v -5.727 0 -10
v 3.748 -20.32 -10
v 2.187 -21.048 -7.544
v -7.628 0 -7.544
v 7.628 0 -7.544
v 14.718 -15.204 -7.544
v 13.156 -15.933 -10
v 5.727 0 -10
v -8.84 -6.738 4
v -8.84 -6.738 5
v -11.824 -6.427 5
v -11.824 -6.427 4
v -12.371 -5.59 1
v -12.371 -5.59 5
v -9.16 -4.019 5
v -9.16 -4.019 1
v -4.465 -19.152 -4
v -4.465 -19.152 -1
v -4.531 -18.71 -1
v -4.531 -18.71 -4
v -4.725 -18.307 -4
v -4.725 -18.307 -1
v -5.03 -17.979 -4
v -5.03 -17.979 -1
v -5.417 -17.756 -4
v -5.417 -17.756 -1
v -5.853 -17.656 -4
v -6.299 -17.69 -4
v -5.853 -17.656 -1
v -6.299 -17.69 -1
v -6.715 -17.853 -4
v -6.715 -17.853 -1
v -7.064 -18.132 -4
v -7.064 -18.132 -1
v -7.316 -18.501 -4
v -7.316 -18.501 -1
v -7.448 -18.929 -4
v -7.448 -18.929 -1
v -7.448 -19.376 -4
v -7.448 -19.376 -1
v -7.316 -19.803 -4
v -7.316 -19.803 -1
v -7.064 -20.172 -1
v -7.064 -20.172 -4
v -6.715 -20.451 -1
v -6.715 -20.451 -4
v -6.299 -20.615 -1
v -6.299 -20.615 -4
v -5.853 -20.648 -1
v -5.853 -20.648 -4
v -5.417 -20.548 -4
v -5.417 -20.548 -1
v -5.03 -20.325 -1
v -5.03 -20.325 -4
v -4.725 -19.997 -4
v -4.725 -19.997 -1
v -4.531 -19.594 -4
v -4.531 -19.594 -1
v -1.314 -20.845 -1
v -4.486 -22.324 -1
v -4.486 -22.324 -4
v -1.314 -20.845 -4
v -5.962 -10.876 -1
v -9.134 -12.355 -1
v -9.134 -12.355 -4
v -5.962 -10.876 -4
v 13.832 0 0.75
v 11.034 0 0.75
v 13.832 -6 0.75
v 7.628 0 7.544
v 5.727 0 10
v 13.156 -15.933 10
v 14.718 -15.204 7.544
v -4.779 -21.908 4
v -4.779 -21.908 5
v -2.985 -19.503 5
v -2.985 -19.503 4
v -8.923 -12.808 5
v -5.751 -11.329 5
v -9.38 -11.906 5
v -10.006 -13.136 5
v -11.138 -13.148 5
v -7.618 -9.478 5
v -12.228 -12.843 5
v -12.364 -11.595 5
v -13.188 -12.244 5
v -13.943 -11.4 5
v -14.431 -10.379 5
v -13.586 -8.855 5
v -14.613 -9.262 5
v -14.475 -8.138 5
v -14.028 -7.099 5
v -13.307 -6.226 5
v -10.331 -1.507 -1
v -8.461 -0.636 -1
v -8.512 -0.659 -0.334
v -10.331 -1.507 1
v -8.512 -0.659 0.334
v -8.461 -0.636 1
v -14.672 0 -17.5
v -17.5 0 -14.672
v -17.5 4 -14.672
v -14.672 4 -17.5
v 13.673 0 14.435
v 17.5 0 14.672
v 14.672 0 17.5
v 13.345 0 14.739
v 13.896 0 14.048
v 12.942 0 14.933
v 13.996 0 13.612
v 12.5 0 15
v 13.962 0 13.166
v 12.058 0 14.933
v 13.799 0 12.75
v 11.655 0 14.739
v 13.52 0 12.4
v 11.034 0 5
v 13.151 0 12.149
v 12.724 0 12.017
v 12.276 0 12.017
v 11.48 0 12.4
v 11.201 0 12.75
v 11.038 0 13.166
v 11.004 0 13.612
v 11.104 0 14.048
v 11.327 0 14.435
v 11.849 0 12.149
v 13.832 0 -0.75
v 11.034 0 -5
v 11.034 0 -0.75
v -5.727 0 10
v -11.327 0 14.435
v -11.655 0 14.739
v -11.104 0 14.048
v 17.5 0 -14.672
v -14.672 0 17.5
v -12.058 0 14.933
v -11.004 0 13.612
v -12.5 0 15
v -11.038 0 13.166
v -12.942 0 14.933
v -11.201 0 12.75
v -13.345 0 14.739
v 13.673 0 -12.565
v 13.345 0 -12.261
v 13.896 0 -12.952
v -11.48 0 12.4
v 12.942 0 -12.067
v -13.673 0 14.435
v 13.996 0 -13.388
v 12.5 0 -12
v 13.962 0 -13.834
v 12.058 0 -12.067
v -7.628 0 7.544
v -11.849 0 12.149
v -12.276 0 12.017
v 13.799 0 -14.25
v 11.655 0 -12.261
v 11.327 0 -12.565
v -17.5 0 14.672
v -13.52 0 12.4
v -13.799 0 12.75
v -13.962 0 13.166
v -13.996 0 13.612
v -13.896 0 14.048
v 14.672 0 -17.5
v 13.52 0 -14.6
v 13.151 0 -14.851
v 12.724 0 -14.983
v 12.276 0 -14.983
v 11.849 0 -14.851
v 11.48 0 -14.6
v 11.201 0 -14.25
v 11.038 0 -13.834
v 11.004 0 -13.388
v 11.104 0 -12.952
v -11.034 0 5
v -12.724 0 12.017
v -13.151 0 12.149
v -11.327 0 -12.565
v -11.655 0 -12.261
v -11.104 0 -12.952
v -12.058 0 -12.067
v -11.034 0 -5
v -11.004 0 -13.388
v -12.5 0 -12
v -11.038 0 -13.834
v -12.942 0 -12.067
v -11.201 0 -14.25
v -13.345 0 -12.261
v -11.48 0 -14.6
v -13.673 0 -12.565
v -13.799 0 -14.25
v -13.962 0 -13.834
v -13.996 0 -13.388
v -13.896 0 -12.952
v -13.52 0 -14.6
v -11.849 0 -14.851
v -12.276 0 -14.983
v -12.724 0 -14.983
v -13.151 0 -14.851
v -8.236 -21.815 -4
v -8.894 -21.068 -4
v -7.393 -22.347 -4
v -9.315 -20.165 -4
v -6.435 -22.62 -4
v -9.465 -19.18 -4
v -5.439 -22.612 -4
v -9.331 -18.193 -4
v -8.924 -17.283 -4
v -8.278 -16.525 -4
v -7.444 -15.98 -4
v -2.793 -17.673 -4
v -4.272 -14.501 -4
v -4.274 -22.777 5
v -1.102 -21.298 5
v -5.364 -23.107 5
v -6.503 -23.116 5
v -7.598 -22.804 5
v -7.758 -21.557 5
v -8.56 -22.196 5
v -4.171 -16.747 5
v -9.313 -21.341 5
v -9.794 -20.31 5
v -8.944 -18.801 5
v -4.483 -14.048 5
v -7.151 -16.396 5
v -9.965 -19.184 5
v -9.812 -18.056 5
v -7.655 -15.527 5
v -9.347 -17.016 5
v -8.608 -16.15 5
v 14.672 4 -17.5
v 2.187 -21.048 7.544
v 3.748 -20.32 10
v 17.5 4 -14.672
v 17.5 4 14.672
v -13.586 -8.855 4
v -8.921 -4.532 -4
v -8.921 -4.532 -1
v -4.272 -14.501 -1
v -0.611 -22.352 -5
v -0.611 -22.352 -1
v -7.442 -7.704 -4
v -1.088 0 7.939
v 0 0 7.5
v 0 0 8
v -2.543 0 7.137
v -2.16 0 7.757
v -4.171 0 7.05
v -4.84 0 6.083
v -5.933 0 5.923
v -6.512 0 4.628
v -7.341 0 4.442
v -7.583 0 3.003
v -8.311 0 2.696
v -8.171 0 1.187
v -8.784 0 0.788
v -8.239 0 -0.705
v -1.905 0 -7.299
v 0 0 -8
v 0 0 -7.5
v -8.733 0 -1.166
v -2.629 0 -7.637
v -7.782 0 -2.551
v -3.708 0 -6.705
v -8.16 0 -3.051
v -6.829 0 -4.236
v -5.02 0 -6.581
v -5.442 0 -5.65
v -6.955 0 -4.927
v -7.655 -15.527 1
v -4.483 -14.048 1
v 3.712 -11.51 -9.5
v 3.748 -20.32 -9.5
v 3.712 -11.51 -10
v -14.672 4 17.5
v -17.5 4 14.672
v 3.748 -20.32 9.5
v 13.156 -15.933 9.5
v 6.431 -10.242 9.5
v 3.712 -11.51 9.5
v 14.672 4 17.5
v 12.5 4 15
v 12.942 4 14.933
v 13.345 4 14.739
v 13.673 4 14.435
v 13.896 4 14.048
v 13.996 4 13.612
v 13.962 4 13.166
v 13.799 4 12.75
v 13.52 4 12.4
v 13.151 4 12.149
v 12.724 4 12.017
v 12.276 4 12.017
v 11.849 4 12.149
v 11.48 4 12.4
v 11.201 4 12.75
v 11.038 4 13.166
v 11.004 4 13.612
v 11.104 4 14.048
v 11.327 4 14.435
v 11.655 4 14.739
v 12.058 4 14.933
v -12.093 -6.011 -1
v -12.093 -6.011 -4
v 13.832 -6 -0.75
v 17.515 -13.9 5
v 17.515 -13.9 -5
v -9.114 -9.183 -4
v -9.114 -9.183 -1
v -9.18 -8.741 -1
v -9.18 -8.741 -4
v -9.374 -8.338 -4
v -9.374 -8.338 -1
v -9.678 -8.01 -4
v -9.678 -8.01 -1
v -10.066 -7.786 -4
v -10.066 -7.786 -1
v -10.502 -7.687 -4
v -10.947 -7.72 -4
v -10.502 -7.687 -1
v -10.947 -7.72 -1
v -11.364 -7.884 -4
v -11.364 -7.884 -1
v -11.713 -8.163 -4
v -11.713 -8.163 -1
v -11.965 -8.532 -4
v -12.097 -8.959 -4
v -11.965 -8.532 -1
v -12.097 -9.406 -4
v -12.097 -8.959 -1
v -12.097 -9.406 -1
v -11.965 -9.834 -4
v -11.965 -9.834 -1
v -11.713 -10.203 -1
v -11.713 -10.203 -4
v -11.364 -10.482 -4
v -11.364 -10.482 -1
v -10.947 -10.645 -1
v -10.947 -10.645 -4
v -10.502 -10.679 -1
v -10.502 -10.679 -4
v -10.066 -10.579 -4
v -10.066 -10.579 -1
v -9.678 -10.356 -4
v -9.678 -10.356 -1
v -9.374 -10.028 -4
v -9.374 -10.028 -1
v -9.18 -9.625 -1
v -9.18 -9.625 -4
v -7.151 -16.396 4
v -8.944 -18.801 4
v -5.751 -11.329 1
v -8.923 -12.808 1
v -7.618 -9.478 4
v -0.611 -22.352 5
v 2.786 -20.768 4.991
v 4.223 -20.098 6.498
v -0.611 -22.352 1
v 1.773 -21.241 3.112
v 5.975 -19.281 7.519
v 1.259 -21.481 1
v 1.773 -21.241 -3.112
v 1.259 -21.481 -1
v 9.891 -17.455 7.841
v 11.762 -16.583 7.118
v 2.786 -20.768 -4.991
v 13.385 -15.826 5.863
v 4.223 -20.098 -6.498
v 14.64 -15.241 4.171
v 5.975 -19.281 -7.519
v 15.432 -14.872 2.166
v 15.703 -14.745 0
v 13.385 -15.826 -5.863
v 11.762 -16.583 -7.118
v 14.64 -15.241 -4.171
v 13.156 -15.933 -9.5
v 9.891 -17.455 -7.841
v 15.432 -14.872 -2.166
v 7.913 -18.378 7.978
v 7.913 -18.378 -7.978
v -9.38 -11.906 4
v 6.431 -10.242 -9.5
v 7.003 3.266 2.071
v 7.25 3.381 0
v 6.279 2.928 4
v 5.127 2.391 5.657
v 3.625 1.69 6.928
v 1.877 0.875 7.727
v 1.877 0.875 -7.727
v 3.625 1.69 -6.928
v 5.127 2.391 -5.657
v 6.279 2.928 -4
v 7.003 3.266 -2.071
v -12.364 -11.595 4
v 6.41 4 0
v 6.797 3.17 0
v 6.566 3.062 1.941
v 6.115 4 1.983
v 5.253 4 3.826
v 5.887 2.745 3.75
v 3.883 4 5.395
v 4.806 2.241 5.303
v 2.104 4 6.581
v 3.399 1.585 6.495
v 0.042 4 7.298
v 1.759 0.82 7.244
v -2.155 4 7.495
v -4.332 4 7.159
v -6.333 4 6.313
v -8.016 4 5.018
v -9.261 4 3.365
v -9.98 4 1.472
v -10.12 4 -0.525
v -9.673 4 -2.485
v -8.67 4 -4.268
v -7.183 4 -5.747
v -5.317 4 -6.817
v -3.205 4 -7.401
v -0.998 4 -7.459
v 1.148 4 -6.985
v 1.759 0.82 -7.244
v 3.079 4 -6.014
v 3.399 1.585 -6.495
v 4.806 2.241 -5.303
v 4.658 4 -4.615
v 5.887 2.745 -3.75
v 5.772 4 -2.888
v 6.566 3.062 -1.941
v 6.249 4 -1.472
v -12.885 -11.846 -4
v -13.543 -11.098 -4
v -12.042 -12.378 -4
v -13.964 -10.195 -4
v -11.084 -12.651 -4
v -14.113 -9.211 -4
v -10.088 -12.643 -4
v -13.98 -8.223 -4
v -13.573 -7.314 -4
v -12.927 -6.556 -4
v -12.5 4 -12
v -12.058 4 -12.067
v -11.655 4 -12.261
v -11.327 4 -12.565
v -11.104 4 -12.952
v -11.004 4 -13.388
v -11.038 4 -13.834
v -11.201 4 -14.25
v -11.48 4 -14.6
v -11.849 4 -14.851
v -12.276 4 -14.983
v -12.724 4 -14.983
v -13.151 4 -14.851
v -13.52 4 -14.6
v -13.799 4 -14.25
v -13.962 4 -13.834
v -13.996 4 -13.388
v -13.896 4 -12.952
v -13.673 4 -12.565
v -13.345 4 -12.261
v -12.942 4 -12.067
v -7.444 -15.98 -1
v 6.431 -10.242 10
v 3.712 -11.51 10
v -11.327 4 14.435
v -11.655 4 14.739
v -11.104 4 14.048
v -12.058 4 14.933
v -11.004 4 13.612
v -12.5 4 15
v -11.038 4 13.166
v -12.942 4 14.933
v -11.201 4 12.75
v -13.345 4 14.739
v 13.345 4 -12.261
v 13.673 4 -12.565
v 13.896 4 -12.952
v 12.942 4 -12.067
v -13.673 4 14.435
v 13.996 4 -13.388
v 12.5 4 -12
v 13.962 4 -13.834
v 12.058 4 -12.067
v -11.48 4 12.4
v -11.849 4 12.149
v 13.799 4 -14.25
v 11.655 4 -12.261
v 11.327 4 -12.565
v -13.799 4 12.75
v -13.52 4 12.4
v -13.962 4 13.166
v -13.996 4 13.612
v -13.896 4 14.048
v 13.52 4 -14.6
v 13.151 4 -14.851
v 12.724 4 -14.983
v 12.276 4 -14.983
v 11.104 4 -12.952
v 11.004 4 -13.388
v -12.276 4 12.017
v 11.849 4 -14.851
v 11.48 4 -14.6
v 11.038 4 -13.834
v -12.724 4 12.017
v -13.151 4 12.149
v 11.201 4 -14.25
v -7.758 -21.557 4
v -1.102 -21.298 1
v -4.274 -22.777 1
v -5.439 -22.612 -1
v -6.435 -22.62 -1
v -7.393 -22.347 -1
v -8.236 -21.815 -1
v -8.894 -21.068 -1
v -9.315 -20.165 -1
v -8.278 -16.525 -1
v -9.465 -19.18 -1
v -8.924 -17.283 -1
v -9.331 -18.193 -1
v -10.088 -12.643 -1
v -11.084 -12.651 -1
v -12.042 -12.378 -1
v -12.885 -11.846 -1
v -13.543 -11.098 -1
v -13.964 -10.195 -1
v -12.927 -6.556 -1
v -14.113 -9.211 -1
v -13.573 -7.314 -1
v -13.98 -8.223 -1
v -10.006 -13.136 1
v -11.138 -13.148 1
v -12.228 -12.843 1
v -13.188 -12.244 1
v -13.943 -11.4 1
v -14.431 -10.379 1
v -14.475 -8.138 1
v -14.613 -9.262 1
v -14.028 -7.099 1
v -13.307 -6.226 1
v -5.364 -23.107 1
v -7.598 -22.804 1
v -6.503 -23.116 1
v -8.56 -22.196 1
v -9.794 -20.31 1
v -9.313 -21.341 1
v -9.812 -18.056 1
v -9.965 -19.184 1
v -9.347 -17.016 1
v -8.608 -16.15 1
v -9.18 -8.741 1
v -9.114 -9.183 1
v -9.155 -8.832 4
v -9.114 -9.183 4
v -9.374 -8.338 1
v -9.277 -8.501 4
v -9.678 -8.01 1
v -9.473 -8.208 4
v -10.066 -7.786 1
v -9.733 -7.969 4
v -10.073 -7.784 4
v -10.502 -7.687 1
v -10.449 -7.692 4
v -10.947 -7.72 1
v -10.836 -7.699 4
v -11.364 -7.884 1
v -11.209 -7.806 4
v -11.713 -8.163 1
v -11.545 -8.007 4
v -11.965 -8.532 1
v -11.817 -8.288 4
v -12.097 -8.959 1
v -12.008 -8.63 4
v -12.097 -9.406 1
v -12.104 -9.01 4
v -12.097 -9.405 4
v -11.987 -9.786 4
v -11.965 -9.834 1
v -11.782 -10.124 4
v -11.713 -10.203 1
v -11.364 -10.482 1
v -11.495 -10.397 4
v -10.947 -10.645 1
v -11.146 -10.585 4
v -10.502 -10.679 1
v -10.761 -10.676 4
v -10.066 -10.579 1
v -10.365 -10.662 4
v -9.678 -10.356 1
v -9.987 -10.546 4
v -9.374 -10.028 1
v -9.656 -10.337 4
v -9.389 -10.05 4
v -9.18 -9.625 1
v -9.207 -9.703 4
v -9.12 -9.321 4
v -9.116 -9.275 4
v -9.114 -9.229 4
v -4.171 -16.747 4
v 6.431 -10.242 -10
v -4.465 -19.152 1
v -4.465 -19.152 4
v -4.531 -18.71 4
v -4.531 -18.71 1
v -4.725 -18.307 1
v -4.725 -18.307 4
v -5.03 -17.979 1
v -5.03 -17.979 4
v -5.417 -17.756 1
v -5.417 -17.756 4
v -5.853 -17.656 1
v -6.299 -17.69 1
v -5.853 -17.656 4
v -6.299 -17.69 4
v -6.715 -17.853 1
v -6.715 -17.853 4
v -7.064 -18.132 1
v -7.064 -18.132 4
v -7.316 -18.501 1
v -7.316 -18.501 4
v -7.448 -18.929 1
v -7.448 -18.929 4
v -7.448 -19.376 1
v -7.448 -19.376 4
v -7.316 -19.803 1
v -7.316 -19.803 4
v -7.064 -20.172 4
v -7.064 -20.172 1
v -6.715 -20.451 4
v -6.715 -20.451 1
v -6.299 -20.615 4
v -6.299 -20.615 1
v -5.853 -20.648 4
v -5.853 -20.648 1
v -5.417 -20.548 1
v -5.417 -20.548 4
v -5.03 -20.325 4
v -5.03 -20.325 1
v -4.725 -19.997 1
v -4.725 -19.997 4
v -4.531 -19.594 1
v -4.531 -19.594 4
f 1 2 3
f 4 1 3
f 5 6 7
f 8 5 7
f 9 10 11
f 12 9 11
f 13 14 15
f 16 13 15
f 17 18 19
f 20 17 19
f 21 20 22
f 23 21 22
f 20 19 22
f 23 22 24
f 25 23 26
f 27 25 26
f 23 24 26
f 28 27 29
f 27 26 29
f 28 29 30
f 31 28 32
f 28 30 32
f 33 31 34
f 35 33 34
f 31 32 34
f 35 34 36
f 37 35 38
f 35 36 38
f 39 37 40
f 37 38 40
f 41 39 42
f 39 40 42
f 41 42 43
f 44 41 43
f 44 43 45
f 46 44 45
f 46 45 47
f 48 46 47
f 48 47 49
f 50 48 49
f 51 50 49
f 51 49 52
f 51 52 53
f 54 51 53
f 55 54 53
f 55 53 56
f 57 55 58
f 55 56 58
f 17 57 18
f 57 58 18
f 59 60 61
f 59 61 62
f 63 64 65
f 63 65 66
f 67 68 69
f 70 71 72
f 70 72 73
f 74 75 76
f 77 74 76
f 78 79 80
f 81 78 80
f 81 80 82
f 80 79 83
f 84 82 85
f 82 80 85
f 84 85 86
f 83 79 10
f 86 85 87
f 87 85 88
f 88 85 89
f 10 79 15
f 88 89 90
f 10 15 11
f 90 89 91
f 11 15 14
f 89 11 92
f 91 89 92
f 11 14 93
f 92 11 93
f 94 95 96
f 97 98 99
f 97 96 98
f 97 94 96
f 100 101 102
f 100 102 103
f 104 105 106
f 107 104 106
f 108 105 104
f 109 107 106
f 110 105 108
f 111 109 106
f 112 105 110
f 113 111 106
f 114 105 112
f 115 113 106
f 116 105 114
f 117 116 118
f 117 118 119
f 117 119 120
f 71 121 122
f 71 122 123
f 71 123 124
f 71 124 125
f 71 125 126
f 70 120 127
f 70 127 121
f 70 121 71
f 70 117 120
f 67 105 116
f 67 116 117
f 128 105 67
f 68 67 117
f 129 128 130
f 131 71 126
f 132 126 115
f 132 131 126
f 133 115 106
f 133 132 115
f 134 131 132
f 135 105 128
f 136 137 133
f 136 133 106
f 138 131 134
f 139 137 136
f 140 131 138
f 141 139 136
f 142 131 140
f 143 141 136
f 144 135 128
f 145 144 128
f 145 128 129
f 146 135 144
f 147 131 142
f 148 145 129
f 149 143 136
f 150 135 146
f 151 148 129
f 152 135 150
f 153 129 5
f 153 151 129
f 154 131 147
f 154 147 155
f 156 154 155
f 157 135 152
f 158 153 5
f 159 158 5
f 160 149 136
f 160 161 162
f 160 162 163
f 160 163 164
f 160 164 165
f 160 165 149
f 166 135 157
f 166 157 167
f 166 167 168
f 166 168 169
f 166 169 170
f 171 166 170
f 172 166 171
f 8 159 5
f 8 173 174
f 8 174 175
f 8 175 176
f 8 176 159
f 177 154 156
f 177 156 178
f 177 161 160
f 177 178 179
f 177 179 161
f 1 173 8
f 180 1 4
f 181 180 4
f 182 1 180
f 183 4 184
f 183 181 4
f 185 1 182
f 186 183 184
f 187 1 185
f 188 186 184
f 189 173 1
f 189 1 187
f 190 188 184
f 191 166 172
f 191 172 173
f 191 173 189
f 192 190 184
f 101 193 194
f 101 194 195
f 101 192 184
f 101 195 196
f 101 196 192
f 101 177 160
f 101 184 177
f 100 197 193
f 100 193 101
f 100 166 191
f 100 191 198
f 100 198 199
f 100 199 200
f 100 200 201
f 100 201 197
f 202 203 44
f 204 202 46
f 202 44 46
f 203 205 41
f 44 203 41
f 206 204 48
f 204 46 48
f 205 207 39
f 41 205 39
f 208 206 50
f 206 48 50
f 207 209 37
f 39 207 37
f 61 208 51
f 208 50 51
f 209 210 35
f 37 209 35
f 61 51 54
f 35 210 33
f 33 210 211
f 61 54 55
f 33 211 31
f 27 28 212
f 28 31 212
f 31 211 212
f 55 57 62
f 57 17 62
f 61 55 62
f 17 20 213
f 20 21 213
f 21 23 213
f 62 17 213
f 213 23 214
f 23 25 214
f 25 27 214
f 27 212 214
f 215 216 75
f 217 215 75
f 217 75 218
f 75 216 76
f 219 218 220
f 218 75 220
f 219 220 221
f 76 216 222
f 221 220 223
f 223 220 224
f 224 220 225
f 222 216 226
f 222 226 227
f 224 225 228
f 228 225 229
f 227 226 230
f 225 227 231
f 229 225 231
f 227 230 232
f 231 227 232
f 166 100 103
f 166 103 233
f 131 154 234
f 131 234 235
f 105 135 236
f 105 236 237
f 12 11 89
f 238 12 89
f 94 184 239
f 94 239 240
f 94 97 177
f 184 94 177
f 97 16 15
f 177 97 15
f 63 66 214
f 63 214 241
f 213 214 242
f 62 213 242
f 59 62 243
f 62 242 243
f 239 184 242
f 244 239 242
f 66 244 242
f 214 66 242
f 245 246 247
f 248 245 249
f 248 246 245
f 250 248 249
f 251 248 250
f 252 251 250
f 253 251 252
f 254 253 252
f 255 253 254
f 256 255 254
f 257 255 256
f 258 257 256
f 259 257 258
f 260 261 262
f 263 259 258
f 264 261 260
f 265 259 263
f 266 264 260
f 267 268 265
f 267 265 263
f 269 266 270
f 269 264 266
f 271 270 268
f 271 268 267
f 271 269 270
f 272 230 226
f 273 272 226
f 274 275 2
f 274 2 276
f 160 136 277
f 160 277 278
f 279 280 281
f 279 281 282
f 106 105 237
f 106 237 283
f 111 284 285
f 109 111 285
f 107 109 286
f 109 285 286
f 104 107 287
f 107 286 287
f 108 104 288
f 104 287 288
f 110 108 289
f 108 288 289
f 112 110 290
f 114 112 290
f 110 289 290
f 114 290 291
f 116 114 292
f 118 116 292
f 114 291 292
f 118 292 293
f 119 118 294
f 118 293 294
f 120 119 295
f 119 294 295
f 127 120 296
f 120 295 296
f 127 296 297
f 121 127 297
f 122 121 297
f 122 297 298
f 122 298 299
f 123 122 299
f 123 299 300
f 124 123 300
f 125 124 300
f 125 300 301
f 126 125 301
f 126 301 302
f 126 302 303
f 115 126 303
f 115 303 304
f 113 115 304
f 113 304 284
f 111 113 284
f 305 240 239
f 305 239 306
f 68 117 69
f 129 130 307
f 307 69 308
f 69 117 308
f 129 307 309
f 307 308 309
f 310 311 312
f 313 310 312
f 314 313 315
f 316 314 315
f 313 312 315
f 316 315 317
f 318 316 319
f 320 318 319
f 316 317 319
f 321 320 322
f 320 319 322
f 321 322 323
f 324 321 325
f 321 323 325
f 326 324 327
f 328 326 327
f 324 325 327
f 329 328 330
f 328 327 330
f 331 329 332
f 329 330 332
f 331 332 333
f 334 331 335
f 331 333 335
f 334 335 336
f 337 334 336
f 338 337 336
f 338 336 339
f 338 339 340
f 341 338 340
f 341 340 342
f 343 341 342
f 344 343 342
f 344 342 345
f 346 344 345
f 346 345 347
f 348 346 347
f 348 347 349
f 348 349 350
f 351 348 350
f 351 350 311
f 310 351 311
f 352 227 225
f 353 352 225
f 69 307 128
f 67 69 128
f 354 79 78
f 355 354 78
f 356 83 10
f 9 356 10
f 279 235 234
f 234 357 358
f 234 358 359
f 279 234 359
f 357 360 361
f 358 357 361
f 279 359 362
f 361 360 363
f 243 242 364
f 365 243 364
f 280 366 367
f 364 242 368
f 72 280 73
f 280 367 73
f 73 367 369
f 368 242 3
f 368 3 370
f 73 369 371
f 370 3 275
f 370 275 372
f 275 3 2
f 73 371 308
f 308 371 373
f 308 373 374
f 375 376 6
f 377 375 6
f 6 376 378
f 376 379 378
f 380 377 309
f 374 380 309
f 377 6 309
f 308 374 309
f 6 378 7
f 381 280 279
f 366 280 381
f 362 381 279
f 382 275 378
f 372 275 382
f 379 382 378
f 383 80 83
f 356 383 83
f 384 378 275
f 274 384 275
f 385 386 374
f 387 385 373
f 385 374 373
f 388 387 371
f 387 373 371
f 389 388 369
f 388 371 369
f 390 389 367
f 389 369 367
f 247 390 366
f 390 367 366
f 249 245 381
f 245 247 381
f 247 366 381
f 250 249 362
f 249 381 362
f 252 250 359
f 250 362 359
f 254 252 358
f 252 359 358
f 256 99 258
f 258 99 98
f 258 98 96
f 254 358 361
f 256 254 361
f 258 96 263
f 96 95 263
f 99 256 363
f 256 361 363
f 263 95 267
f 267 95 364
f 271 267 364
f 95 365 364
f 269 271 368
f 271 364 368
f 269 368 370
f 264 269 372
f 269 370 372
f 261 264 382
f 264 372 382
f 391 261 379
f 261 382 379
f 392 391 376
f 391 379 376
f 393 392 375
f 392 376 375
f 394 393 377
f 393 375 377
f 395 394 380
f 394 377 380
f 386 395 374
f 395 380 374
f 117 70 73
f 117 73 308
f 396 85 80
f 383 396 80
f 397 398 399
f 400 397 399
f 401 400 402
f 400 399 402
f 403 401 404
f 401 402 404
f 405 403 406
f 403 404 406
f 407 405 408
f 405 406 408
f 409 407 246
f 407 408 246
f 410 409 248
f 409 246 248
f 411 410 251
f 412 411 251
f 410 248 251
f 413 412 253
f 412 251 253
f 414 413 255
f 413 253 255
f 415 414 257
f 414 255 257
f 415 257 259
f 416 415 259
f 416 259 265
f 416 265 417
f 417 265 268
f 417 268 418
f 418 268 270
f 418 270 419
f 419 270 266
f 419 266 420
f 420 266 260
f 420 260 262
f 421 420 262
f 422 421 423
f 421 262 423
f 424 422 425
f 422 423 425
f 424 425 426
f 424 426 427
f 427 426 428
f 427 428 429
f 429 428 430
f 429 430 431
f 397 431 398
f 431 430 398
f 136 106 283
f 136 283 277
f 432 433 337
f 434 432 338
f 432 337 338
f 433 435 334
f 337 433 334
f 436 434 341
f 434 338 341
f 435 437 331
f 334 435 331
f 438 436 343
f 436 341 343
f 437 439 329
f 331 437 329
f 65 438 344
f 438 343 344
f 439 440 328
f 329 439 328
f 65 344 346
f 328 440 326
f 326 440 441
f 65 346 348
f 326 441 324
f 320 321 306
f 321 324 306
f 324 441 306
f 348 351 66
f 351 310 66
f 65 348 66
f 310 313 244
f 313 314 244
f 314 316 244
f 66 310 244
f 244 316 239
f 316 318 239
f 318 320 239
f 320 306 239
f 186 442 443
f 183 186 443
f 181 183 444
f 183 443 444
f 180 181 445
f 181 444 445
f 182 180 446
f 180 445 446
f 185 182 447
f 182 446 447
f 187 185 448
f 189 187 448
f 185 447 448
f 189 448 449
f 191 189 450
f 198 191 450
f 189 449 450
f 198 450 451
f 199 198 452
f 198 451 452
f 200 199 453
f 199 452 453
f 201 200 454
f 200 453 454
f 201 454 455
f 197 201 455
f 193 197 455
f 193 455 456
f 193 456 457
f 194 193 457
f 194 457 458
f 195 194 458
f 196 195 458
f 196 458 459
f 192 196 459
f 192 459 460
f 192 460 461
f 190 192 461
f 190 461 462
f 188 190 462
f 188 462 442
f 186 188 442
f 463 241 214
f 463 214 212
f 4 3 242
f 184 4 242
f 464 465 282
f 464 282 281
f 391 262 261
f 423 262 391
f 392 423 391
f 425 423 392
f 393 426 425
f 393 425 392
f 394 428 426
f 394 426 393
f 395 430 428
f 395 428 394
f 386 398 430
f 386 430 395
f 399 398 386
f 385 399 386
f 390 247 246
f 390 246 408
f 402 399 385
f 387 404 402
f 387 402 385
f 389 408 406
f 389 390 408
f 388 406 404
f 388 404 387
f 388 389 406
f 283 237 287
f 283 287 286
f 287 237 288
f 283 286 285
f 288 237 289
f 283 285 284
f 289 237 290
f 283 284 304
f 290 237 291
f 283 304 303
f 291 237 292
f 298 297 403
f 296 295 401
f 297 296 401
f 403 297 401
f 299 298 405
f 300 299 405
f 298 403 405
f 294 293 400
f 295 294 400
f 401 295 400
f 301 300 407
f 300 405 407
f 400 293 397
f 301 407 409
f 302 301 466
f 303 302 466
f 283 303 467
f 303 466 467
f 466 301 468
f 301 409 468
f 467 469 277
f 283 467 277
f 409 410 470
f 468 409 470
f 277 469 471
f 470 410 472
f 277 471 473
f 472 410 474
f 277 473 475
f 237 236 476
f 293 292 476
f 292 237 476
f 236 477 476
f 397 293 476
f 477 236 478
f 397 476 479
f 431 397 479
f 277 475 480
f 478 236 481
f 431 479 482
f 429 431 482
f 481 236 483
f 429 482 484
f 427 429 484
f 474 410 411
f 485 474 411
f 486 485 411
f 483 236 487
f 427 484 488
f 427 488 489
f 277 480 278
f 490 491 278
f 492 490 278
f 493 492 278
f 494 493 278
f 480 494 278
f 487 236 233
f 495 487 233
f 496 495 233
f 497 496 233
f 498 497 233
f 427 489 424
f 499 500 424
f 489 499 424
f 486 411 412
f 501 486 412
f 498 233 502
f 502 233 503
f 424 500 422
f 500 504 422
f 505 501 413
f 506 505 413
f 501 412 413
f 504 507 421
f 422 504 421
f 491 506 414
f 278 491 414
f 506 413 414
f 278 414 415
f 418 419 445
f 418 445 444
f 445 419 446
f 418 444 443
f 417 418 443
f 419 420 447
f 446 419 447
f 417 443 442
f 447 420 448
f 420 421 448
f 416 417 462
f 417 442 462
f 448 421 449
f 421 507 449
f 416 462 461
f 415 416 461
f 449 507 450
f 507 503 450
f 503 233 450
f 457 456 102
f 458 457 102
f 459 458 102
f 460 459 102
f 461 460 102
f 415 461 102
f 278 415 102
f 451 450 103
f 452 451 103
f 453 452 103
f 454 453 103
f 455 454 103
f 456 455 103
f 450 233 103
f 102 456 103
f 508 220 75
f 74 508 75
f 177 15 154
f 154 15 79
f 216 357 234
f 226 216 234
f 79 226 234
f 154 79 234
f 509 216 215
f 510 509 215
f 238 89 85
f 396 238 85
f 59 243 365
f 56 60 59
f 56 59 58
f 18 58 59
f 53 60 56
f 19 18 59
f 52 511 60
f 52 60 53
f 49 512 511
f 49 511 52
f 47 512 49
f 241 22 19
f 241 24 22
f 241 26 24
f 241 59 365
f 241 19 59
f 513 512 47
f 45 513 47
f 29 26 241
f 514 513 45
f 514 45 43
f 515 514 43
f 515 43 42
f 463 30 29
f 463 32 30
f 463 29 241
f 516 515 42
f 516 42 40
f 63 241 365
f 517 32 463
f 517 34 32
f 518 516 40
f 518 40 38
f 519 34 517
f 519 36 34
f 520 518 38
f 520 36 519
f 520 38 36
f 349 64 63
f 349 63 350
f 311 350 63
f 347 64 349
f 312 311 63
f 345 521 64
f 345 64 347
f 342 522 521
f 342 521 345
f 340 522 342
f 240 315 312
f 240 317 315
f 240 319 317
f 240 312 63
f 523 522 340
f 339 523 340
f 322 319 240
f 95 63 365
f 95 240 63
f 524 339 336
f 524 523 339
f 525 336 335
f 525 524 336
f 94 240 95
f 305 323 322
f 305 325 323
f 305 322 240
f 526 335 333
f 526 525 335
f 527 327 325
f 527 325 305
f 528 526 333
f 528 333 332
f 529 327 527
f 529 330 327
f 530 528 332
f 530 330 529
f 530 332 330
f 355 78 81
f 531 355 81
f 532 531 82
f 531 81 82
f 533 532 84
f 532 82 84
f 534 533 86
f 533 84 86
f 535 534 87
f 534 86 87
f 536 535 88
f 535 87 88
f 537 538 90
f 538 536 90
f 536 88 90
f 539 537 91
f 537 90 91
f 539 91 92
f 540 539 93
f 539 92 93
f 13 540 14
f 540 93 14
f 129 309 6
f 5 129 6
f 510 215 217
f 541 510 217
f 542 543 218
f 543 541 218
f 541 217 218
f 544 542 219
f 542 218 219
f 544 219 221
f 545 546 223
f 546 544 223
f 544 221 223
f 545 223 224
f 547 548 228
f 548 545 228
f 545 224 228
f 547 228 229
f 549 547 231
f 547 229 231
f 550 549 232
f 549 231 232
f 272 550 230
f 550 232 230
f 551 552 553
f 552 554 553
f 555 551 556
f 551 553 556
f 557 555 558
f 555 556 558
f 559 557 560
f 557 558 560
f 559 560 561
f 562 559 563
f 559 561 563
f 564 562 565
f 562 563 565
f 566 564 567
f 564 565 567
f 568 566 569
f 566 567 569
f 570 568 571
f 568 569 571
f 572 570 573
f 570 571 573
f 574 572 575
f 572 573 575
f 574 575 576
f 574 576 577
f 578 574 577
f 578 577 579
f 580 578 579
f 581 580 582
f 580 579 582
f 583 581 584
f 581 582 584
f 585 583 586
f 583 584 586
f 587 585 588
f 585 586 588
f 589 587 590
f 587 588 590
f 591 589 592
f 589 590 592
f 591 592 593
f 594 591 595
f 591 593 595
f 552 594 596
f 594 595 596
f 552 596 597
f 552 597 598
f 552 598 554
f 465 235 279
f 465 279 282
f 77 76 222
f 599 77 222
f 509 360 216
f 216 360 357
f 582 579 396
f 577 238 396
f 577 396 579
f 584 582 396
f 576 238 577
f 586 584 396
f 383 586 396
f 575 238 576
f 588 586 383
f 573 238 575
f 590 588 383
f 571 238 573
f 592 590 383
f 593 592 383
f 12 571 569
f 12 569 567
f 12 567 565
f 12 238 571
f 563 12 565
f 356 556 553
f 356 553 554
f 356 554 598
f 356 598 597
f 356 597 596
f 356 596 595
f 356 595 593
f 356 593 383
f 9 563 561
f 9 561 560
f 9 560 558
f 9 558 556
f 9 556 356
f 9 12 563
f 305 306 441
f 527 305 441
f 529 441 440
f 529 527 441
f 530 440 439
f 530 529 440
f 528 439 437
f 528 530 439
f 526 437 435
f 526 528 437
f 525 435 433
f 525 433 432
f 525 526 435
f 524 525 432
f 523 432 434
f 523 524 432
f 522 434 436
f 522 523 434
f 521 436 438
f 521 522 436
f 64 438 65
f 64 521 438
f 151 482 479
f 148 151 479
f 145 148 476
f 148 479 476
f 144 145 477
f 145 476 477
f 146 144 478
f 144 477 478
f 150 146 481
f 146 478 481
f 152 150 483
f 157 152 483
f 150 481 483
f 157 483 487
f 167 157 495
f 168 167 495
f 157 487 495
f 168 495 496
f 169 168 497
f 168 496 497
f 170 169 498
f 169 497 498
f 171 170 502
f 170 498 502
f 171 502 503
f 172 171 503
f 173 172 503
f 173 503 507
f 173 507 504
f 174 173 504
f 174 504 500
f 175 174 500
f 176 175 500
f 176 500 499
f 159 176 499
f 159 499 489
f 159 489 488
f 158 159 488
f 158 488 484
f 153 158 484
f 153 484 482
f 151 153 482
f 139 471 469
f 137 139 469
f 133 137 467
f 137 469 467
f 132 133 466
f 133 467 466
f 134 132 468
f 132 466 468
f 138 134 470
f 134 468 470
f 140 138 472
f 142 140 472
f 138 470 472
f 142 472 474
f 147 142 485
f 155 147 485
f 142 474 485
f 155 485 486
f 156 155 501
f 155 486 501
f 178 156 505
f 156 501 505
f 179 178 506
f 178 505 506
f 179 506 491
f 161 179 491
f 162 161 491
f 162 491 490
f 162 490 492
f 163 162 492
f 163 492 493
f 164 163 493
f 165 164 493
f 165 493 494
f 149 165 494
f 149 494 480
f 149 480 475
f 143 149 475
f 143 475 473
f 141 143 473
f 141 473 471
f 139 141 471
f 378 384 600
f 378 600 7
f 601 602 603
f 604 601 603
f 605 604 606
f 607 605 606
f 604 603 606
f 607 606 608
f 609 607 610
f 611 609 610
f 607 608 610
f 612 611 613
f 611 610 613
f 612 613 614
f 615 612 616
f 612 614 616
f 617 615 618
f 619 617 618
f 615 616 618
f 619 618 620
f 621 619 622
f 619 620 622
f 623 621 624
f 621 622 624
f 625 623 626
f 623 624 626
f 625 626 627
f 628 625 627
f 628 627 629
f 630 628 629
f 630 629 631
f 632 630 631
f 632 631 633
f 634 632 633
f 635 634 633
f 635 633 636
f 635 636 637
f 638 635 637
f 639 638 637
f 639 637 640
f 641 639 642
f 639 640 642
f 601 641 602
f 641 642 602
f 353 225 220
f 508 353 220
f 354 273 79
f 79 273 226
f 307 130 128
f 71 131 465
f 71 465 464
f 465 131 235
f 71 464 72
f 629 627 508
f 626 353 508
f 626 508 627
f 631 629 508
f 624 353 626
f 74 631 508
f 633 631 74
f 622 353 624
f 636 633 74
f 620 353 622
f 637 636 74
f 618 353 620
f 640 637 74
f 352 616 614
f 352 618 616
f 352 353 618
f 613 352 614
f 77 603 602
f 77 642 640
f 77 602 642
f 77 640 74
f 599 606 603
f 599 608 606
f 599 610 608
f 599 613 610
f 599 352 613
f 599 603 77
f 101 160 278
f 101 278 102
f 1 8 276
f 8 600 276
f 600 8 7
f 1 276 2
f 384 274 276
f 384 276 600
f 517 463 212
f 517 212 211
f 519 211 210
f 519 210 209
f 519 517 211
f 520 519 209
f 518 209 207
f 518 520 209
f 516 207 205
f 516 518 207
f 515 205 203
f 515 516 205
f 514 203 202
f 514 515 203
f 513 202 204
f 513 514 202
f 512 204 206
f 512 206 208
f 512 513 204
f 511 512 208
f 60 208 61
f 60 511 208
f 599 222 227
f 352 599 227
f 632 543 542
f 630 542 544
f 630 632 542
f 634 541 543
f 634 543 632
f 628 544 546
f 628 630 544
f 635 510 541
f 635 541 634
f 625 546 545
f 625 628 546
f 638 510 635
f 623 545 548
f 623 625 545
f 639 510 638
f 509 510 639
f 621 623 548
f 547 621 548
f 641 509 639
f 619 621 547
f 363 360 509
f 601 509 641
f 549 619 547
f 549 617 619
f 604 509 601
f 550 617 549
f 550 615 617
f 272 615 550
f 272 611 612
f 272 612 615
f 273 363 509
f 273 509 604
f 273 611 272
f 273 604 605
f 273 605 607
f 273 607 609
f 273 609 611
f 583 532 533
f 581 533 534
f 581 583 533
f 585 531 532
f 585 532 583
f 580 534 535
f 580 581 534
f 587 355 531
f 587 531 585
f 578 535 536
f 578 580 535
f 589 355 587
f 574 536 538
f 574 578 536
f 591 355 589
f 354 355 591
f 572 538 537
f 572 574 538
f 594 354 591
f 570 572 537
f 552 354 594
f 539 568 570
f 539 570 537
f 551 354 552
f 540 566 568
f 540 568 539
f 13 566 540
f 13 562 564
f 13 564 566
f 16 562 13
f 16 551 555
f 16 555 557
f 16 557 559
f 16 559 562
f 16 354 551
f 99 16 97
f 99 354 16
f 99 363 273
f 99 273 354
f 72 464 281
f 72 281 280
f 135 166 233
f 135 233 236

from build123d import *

# Parameters (mm, degrees)
BOSS_EXTRUDE1_DEPTH            = 4
SKETCH2_R                      = 1.5
CUT_EXTRUDE1_DEPTH             = 26.069902273
BOSS_EXTRUDE2_REACH            = 56.739
SKETCH4_R                      = 8
SKETCH5_R                      = 8
CUT_EXTRUDE2_DEPTH             = 20
BOSS_EXTRUDE3_DEPTH            = 0.75
BOSS_EXTRUDE3_DEPTH_BACK       = 0.75
SKETCH8_R                      = 1.5
BOSS_EXTRUDE4_DEPTH            = 4
BOSS_EXTRUDE5_START            = 5
SKETCH9_R                      = 1.5
BOSS_EXTRUDE5_DEPTH            = 5
CUT_EXTRUDE3_REACH             = 39.025
CUT_EXTRUDE3_END_RADIUS        = 8
SKETCH10_W                     = 2
SKETCH10_H                     = 23
CUT_EXTRUDE3_DIRECTION_2_DEPTH = 38.025134912
CUT_EXTRUDE4_DEPTH             = 0.5
CUT_EXTRUDE5_DEPTH             = 40.98829237
CUT_EXTRUDE5_DEPTH_BACK        = 0.5
SKETCH13_R                     = 7.5
CUT_EXTRUDE6_DEPTH             = 34.897839558
SKETCH14_R                     = 1.5
CUT_EXTRUDE7_DEPTH             = 1


with BuildPart() as part:
    # Sketch1 → Boss-Extrude1 (new body)
    with BuildSketch(Plane(origin=(0, 0, 0), x_dir=(1, 0, 0), z_dir=(0, 1, 0))):
        Polygon((-17.5, 14.671572875), (-14.671572875, 17.5), (14.671572875, 17.5), (17.5, 14.671572875), (17.5, -14.671572875), (14.671572875, -17.5), (-14.671572875, -17.5), (-17.5, -14.671572875), align=None)
    extrude(amount=BOSS_EXTRUDE1_DEPTH)

    # Sketch2 → Cut-Extrude1 (cut, through all)
    with BuildSketch(Plane(origin=(0, 4, 0), x_dir=(1, 0, 0), z_dir=(0, 1, 0))):
        with Locations((-12.5, 13.5)):
            Circle(SKETCH2_R)
        with Locations((12.5, 13.5)):
            Circle(SKETCH2_R)
        with Locations((-12.5, -13.5)):
            Circle(SKETCH2_R)
        with Locations((12.5, -13.5)):
            Circle(SKETCH2_R)
    extrude(amount=-CUT_EXTRUDE1_DEPTH, mode=Mode.SUBTRACT)

    # Boss-Extrude2: up to this plane
    boss_extrude2_end = Plane(origin=(0, 0, 0), z_dir=(0, 1, 0))
    # Sketch4 → Boss-Extrude2 (add, up to the surface)
    with BuildSketch(Plane(origin=(8.452365235, -18.126155741, 0), x_dir=(-0.906307787036651, -0.42261826174069733, 0), z_dir=(0.4226182617406973, -0.9063077870366509, 0)), mode=Mode.PRIVATE) as boss_extrude2_sk1:
        Polygon((10, 5), (10, -5), (6.91357525, -7.544402143), (5.190195094, -10), (-5.190195094, -10), (-6.91357525, -7.544402143), (-10, -5), (-10, 5), (-6.91357525, 7.544402143), (-5.190195094, 10), (5.190195094, 10), (6.91357525, 7.544402143), align=None)
        Circle(SKETCH4_R, mode=Mode.SUBTRACT)
    boss_extrude2_tool1 = split(extrude(boss_extrude2_sk1.sketch, amount=-BOSS_EXTRUDE2_REACH, mode=Mode.PRIVATE), bisect_by=boss_extrude2_end, keep=Keep.BOTH, mode=Mode.PRIVATE)
    add(boss_extrude2_tool1.solids().sort_by_distance((-0.35437, -22.232804, 0))[0])

    # Sketch5 → Cut-Extrude2 (cut)
    with BuildSketch(Plane(origin=(8.452365235, -18.126155741, 0), x_dir=(-0.906307787036651, -0.42261826174069733, 0), z_dir=(0.4226182617406973, -0.9063077870366509, 0))):
        Circle(SKETCH5_R)
    extrude(amount=-CUT_EXTRUDE2_DEPTH, mode=Mode.SUBTRACT)

    # Sketch7 → Boss-Extrude3 (add, two sides: drawn at the far end of the back side and taken through both)
    with BuildSketch(Plane.XY.offset(-BOSS_EXTRUDE3_DEPTH_BACK)):
        Polygon((11.03377919, 0), (13.831625139, -6), (13.831625139, 0), align=None)
    extrude(amount=BOSS_EXTRUDE3_DEPTH + BOSS_EXTRUDE3_DEPTH_BACK)

    # Sketch8 → Boss-Extrude4 (add)
    # profile 1 of 2: a face of its own
    with BuildSketch(Plane.XY):
        with BuildLine():
            Line((-4.271887002, -14.500924593), (-7.443964256, -15.980088509))
            ThreePointArc((-7.443964256, -15.980088509), (-9.136877595, -20.631329679), (-4.485636424, -22.324243018))
            Line((-4.485636424, -22.324243018), (-1.31355917, -20.845079102))
            Line((-1.31355917, -20.845079102), (-4.271887002, -14.500924593))
        make_face()
        with Locations((-5.96480034, -19.152165763)):
            Circle(SKETCH8_R, mode=Mode.SUBTRACT)
    # profile 2 of 2: a face of its own
    with BuildSketch(Plane.XY):
        with BuildLine():
            Line((-9.134437303, -12.354857361), (-5.962360049, -10.875693444))
            Line((-5.962360049, -10.875693444), (-8.920687881, -4.531538935))
            Line((-8.920687881, -4.531538935), (-12.092765136, -6.010702851))
            ThreePointArc((-12.092765136, -6.010702851), (-13.785678474, -10.661944022), (-9.134437303, -12.354857361))
        make_face()
        with Locations((-10.613601219, -9.182780106)):
            Circle(SKETCH8_R, mode=Mode.SUBTRACT)
    extrude(amount=-BOSS_EXTRUDE4_DEPTH)

    # Sketch9 → Boss-Extrude5 (add)
    # profile 1 of 2: a face of its own
    with BuildSketch(Plane.XY.offset(BOSS_EXTRUDE5_START)):
        with BuildLine():
            Line((-12.371097281, -5.589563219), (-9.159758839, -4.01884961))
            Line((-9.159758839, -4.01884961), (-5.751050918, -11.328847338))
            Line((-5.751050918, -11.328847338), (-8.923128172, -12.808011254))
            ThreePointArc((-8.923128172, -12.808011254), (-14.22298081, -10.906838971), (-12.371097281, -5.589563219))
        make_face()
        with Locations((-10.613601219, -9.182780106)):
            Circle(SKETCH9_R, mode=Mode.SUBTRACT)
    # profile 2 of 2: a face of its own
    with BuildSketch(Plane.XY.offset(BOSS_EXTRUDE5_START)):
        with BuildLine():
            Line((-7.655273387, -15.526934615), (-4.483196133, -14.047770699))
            Line((-4.483196133, -14.047770699), (-1.102250039, -21.298232995))
            Line((-1.102250039, -21.298232995), (-4.274327293, -22.777396911))
            ThreePointArc((-4.274327293, -22.777396911), (-9.590031488, -20.84263881), (-7.655273387, -15.526934615))
        make_face()
        with Locations((-5.96480034, -19.152165763)):
            Circle(SKETCH9_R, mode=Mode.SUBTRACT)
    extrude(amount=-BOSS_EXTRUDE5_DEPTH)

    # Cut-Extrude3: up to this cylinder (the profile starts outside it)
    cut_extrude3_end = Plane(origin=(3.592255235, -7.703616212, 0), z_dir=(0.4226182617406974, -0.906307787036651, 0)) * Cylinder(CUT_EXTRUDE3_END_RADIUS, 95.05, mode=Mode.PRIVATE)
    # Sketch10 → Cut-Extrude3 (cut, up to the surface)
    with BuildSketch(Plane(origin=(-9.06307787, -4.226182617, 0), x_dir=(0, 0, 1), z_dir=(-0.9063077870366509, -0.42261826174069744, 0)), mode=Mode.PRIVATE) as cut_extrude3_sk1:
        with Locations((0, -8.5)):
            Rectangle(SKETCH10_W, SKETCH10_H)
    cut_extrude3_tool1 = extrude(cut_extrude3_sk1.sketch, amount=-CUT_EXTRUDE3_REACH, mode=Mode.PRIVATE) - cut_extrude3_end
    add(cut_extrude3_tool1.solids().sort_by_distance((-5.470823, -11.929799, 0))[0], mode=Mode.SUBTRACT)

    # Sketch10 → Cut-Extrude3 direction 2 (cut)
    with BuildSketch(Plane(origin=(-9.06307787, -4.226182617, 0), x_dir=(0, 0, 1), z_dir=(-0.9063077870366509, -0.42261826174069744, 0))):
        with Locations((0, -8.5)):
            Rectangle(SKETCH10_W, SKETCH10_H)
    extrude(amount=CUT_EXTRUDE3_DIRECTION_2_DEPTH, mode=Mode.SUBTRACT)

    # Sketch11 → Cut-Extrude4 (cut)
    with BuildSketch(Plane.XY.offset(10)):
        Polygon((3.748451005, -20.319626969), (3.71195746, -11.509620837), (6.430880821, -10.241766052), (13.156279465, -15.932684512), align=None)
    extrude(amount=-CUT_EXTRUDE4_DEPTH, mode=Mode.SUBTRACT)

    # Sketch12 → Cut-Extrude5 (cut, two sides: drawn at the far end of the back side and taken through both)
    with BuildSketch(Plane(origin=(0, 0, -10), x_dir=(-1, 0, 0), z_dir=(0, 0, -1)).offset(-CUT_EXTRUDE5_DEPTH_BACK)):
        Polygon((-76.618175431, -69.633066368), (-13.156279465, -15.932684512), (-6.430880821, -10.241766052), (-3.71195746, -11.509620837), (-3.748451005, -20.319626969), (-4.092809705, -103.452199816), (-74.3600994, -254.140888852), (-146.885465125, -220.321755404), align=None)
    extrude(amount=CUT_EXTRUDE5_DEPTH + CUT_EXTRUDE5_DEPTH_BACK, mode=Mode.SUBTRACT)

    # Sketch13 → Cut-Extrude6 (cut, through all)
    with BuildSketch(Plane(origin=(0, 0, 0), x_dir=(0.9063077870366509, 0.4226182617406975, 0), z_dir=(0.4226182617406975, -0.9063077870366509, 0))):
        Circle(SKETCH13_R)
    extrude(amount=-CUT_EXTRUDE6_DEPTH, mode=Mode.SUBTRACT)

    # Sketch14 → Cut-Extrude7 (cut)
    # profile 1 of 2: a face of its own
    with BuildSketch(Plane.XY.offset(5)):
        Polygon((-12.363797533, -11.594558579), (-9.380056654, -11.906472615), (-7.618060736, -9.478434233), (-8.839805697, -6.738481815), (-11.823546576, -6.42656778), (-13.585542494, -8.854606161), align=None)
        with Locations((-10.613601219, -9.182780106)):
            Circle(SKETCH14_R, mode=Mode.SUBTRACT)
    # profile 2 of 2: a face of its own
    with BuildSketch(Plane.XY.offset(5)):
        Polygon((-7.758410921, -21.556944565), (-4.779006098, -21.907867491), (-2.985395517, -19.50308869), (-4.17118976, -16.747386962), (-7.150594583, -16.396464035), (-8.944205163, -18.801242837), align=None)
    extrude(amount=-CUT_EXTRUDE7_DEPTH, mode=Mode.SUBTRACT)


solid = part.part
